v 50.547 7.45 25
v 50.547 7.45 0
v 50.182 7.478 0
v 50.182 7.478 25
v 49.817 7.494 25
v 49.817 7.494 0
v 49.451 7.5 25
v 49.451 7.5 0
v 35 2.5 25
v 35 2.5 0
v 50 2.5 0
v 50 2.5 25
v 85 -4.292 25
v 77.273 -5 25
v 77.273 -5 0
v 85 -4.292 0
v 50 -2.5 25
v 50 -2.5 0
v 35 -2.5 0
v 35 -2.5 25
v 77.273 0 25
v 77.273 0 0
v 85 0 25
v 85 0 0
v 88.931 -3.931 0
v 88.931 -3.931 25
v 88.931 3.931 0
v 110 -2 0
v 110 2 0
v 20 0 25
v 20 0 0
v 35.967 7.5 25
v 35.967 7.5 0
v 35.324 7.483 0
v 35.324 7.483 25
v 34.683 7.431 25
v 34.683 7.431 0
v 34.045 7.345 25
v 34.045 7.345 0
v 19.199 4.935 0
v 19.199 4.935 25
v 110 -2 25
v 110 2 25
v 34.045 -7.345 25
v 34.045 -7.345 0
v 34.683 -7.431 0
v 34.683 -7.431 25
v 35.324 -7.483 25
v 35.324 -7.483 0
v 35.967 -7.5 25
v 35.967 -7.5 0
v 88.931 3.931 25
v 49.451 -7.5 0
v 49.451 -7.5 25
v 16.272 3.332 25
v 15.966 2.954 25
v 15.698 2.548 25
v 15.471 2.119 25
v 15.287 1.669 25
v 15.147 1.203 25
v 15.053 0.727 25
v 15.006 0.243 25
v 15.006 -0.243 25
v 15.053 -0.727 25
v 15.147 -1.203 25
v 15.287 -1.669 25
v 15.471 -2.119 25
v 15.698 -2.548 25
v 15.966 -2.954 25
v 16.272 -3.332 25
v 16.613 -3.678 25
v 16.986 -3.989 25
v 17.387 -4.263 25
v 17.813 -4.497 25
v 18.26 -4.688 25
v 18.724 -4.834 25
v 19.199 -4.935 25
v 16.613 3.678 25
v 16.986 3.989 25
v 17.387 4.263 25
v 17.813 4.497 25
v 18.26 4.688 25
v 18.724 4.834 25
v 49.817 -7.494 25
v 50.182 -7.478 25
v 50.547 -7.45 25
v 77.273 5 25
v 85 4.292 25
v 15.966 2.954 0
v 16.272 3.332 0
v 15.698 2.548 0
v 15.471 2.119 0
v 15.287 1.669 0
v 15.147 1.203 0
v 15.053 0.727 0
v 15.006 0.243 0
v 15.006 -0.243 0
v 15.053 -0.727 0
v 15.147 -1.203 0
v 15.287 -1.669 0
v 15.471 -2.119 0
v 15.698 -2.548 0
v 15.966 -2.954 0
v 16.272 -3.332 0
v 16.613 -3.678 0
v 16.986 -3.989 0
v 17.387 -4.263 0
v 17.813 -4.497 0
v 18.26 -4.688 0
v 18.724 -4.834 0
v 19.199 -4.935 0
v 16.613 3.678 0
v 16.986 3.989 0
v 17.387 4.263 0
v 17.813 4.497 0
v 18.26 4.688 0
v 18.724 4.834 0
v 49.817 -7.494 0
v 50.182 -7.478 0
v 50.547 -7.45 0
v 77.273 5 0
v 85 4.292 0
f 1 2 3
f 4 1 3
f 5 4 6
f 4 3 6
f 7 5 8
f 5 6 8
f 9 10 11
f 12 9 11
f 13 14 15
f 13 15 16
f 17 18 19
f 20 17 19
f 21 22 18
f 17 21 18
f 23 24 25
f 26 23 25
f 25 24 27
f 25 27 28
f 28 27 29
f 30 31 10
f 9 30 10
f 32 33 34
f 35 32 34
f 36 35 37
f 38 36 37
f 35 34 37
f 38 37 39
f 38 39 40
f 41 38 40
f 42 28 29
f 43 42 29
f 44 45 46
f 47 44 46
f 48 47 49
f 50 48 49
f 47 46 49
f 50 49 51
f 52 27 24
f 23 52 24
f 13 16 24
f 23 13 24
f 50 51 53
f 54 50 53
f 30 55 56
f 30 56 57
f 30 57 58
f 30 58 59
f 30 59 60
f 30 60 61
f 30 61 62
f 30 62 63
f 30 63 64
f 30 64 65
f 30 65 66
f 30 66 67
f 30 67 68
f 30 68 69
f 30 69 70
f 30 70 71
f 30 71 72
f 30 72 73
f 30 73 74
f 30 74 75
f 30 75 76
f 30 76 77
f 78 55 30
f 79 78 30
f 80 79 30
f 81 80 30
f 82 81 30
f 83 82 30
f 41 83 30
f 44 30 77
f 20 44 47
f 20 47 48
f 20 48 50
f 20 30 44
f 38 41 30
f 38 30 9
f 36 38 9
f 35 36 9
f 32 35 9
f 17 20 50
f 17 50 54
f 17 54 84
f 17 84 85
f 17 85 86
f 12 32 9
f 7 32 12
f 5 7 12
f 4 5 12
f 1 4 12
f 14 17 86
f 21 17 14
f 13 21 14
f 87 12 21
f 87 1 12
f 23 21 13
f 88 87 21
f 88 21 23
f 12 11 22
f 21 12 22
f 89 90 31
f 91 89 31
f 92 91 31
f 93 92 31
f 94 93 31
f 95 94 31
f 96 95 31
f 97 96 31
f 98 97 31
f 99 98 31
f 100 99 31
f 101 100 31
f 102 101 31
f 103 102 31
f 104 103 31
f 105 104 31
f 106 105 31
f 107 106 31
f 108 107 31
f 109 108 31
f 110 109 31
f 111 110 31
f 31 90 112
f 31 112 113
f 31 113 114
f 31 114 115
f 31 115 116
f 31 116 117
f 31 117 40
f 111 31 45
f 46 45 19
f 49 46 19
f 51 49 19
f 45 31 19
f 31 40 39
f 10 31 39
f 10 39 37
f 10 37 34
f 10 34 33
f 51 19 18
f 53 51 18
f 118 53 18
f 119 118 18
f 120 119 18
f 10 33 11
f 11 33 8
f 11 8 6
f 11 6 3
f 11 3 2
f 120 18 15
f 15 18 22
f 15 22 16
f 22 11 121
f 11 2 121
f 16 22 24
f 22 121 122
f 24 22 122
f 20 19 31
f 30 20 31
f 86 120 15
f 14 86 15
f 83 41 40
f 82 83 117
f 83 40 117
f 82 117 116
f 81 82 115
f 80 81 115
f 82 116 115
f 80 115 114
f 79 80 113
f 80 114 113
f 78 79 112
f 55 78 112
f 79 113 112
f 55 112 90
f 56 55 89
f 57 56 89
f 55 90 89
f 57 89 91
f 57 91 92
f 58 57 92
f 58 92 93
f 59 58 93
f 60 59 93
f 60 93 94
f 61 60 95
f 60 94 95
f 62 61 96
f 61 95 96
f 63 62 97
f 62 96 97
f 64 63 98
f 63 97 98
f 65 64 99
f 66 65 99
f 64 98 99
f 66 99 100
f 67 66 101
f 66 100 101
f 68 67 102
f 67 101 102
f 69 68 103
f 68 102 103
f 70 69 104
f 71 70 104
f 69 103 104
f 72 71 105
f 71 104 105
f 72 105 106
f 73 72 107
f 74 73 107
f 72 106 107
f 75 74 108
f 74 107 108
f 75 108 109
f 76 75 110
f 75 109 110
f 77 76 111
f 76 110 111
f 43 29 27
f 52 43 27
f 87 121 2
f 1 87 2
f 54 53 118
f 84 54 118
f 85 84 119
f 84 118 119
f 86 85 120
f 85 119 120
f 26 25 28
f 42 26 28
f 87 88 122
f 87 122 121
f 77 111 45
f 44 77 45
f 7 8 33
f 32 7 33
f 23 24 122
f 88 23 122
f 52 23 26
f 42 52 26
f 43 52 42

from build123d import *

# Parameters (mm, degrees)
F1_DEPTH = 25


with BuildPart() as f1:
    # F0 (on Top) → F1 (new body)
    with BuildSketch(Plane.XY):
        with BuildLine():
            Line((34.044999, 7.344999), (19.198959, 4.935416))
            ThreePointArc((19.198959, 4.935416), (15, 0), (19.198959, -4.935416))
            Line((19.198959, -4.935416), (34.044999, -7.344999))
            ThreePointArc((34.044999, -7.344999), (35.003129, -7.461187), (35.967498, -7.5))
            Line((35.967498, -7.5), (49.451151, -7.5))
            ThreePointArc((49.451151, -7.5), (49.999427, -7.487468), (50.546558, -7.449899))
            Line((50.546558, -7.449899), (77.272727, -5))
            Line((77.272727, -5), (85, -4.291667))
            Line((85, -4.291667), (85, 0))
            Line((85, 0), (85, 4.291667))
            Line((85, 4.291667), (77.272727, 5))
            Line((77.272727, 5), (50.546558, 7.449899))
            ThreePointArc((50.546558, 7.449899), (49.999427, 7.487468), (49.451151, 7.5))
            Line((49.451151, 7.5), (35.967498, 7.5))
            ThreePointArc((35.967498, 7.5), (35.003129, 7.461187), (34.044999, 7.344999))
        make_face()
        Polygon((50, 2.5), (77.272727, 0), (50, -2.5), (35, -2.5), (20, 0), (35, 2.5), align=None, mode=Mode.SUBTRACT)
        Polygon((110, 0), (85, 0), (88.931298, -3.931298), (110, -2), align=None)
        Polygon((110, 2), (88.931298, 3.931298), (85, 0), (110, 0), align=None)
    extrude(amount=F1_DEPTH)


solid = f1.part
